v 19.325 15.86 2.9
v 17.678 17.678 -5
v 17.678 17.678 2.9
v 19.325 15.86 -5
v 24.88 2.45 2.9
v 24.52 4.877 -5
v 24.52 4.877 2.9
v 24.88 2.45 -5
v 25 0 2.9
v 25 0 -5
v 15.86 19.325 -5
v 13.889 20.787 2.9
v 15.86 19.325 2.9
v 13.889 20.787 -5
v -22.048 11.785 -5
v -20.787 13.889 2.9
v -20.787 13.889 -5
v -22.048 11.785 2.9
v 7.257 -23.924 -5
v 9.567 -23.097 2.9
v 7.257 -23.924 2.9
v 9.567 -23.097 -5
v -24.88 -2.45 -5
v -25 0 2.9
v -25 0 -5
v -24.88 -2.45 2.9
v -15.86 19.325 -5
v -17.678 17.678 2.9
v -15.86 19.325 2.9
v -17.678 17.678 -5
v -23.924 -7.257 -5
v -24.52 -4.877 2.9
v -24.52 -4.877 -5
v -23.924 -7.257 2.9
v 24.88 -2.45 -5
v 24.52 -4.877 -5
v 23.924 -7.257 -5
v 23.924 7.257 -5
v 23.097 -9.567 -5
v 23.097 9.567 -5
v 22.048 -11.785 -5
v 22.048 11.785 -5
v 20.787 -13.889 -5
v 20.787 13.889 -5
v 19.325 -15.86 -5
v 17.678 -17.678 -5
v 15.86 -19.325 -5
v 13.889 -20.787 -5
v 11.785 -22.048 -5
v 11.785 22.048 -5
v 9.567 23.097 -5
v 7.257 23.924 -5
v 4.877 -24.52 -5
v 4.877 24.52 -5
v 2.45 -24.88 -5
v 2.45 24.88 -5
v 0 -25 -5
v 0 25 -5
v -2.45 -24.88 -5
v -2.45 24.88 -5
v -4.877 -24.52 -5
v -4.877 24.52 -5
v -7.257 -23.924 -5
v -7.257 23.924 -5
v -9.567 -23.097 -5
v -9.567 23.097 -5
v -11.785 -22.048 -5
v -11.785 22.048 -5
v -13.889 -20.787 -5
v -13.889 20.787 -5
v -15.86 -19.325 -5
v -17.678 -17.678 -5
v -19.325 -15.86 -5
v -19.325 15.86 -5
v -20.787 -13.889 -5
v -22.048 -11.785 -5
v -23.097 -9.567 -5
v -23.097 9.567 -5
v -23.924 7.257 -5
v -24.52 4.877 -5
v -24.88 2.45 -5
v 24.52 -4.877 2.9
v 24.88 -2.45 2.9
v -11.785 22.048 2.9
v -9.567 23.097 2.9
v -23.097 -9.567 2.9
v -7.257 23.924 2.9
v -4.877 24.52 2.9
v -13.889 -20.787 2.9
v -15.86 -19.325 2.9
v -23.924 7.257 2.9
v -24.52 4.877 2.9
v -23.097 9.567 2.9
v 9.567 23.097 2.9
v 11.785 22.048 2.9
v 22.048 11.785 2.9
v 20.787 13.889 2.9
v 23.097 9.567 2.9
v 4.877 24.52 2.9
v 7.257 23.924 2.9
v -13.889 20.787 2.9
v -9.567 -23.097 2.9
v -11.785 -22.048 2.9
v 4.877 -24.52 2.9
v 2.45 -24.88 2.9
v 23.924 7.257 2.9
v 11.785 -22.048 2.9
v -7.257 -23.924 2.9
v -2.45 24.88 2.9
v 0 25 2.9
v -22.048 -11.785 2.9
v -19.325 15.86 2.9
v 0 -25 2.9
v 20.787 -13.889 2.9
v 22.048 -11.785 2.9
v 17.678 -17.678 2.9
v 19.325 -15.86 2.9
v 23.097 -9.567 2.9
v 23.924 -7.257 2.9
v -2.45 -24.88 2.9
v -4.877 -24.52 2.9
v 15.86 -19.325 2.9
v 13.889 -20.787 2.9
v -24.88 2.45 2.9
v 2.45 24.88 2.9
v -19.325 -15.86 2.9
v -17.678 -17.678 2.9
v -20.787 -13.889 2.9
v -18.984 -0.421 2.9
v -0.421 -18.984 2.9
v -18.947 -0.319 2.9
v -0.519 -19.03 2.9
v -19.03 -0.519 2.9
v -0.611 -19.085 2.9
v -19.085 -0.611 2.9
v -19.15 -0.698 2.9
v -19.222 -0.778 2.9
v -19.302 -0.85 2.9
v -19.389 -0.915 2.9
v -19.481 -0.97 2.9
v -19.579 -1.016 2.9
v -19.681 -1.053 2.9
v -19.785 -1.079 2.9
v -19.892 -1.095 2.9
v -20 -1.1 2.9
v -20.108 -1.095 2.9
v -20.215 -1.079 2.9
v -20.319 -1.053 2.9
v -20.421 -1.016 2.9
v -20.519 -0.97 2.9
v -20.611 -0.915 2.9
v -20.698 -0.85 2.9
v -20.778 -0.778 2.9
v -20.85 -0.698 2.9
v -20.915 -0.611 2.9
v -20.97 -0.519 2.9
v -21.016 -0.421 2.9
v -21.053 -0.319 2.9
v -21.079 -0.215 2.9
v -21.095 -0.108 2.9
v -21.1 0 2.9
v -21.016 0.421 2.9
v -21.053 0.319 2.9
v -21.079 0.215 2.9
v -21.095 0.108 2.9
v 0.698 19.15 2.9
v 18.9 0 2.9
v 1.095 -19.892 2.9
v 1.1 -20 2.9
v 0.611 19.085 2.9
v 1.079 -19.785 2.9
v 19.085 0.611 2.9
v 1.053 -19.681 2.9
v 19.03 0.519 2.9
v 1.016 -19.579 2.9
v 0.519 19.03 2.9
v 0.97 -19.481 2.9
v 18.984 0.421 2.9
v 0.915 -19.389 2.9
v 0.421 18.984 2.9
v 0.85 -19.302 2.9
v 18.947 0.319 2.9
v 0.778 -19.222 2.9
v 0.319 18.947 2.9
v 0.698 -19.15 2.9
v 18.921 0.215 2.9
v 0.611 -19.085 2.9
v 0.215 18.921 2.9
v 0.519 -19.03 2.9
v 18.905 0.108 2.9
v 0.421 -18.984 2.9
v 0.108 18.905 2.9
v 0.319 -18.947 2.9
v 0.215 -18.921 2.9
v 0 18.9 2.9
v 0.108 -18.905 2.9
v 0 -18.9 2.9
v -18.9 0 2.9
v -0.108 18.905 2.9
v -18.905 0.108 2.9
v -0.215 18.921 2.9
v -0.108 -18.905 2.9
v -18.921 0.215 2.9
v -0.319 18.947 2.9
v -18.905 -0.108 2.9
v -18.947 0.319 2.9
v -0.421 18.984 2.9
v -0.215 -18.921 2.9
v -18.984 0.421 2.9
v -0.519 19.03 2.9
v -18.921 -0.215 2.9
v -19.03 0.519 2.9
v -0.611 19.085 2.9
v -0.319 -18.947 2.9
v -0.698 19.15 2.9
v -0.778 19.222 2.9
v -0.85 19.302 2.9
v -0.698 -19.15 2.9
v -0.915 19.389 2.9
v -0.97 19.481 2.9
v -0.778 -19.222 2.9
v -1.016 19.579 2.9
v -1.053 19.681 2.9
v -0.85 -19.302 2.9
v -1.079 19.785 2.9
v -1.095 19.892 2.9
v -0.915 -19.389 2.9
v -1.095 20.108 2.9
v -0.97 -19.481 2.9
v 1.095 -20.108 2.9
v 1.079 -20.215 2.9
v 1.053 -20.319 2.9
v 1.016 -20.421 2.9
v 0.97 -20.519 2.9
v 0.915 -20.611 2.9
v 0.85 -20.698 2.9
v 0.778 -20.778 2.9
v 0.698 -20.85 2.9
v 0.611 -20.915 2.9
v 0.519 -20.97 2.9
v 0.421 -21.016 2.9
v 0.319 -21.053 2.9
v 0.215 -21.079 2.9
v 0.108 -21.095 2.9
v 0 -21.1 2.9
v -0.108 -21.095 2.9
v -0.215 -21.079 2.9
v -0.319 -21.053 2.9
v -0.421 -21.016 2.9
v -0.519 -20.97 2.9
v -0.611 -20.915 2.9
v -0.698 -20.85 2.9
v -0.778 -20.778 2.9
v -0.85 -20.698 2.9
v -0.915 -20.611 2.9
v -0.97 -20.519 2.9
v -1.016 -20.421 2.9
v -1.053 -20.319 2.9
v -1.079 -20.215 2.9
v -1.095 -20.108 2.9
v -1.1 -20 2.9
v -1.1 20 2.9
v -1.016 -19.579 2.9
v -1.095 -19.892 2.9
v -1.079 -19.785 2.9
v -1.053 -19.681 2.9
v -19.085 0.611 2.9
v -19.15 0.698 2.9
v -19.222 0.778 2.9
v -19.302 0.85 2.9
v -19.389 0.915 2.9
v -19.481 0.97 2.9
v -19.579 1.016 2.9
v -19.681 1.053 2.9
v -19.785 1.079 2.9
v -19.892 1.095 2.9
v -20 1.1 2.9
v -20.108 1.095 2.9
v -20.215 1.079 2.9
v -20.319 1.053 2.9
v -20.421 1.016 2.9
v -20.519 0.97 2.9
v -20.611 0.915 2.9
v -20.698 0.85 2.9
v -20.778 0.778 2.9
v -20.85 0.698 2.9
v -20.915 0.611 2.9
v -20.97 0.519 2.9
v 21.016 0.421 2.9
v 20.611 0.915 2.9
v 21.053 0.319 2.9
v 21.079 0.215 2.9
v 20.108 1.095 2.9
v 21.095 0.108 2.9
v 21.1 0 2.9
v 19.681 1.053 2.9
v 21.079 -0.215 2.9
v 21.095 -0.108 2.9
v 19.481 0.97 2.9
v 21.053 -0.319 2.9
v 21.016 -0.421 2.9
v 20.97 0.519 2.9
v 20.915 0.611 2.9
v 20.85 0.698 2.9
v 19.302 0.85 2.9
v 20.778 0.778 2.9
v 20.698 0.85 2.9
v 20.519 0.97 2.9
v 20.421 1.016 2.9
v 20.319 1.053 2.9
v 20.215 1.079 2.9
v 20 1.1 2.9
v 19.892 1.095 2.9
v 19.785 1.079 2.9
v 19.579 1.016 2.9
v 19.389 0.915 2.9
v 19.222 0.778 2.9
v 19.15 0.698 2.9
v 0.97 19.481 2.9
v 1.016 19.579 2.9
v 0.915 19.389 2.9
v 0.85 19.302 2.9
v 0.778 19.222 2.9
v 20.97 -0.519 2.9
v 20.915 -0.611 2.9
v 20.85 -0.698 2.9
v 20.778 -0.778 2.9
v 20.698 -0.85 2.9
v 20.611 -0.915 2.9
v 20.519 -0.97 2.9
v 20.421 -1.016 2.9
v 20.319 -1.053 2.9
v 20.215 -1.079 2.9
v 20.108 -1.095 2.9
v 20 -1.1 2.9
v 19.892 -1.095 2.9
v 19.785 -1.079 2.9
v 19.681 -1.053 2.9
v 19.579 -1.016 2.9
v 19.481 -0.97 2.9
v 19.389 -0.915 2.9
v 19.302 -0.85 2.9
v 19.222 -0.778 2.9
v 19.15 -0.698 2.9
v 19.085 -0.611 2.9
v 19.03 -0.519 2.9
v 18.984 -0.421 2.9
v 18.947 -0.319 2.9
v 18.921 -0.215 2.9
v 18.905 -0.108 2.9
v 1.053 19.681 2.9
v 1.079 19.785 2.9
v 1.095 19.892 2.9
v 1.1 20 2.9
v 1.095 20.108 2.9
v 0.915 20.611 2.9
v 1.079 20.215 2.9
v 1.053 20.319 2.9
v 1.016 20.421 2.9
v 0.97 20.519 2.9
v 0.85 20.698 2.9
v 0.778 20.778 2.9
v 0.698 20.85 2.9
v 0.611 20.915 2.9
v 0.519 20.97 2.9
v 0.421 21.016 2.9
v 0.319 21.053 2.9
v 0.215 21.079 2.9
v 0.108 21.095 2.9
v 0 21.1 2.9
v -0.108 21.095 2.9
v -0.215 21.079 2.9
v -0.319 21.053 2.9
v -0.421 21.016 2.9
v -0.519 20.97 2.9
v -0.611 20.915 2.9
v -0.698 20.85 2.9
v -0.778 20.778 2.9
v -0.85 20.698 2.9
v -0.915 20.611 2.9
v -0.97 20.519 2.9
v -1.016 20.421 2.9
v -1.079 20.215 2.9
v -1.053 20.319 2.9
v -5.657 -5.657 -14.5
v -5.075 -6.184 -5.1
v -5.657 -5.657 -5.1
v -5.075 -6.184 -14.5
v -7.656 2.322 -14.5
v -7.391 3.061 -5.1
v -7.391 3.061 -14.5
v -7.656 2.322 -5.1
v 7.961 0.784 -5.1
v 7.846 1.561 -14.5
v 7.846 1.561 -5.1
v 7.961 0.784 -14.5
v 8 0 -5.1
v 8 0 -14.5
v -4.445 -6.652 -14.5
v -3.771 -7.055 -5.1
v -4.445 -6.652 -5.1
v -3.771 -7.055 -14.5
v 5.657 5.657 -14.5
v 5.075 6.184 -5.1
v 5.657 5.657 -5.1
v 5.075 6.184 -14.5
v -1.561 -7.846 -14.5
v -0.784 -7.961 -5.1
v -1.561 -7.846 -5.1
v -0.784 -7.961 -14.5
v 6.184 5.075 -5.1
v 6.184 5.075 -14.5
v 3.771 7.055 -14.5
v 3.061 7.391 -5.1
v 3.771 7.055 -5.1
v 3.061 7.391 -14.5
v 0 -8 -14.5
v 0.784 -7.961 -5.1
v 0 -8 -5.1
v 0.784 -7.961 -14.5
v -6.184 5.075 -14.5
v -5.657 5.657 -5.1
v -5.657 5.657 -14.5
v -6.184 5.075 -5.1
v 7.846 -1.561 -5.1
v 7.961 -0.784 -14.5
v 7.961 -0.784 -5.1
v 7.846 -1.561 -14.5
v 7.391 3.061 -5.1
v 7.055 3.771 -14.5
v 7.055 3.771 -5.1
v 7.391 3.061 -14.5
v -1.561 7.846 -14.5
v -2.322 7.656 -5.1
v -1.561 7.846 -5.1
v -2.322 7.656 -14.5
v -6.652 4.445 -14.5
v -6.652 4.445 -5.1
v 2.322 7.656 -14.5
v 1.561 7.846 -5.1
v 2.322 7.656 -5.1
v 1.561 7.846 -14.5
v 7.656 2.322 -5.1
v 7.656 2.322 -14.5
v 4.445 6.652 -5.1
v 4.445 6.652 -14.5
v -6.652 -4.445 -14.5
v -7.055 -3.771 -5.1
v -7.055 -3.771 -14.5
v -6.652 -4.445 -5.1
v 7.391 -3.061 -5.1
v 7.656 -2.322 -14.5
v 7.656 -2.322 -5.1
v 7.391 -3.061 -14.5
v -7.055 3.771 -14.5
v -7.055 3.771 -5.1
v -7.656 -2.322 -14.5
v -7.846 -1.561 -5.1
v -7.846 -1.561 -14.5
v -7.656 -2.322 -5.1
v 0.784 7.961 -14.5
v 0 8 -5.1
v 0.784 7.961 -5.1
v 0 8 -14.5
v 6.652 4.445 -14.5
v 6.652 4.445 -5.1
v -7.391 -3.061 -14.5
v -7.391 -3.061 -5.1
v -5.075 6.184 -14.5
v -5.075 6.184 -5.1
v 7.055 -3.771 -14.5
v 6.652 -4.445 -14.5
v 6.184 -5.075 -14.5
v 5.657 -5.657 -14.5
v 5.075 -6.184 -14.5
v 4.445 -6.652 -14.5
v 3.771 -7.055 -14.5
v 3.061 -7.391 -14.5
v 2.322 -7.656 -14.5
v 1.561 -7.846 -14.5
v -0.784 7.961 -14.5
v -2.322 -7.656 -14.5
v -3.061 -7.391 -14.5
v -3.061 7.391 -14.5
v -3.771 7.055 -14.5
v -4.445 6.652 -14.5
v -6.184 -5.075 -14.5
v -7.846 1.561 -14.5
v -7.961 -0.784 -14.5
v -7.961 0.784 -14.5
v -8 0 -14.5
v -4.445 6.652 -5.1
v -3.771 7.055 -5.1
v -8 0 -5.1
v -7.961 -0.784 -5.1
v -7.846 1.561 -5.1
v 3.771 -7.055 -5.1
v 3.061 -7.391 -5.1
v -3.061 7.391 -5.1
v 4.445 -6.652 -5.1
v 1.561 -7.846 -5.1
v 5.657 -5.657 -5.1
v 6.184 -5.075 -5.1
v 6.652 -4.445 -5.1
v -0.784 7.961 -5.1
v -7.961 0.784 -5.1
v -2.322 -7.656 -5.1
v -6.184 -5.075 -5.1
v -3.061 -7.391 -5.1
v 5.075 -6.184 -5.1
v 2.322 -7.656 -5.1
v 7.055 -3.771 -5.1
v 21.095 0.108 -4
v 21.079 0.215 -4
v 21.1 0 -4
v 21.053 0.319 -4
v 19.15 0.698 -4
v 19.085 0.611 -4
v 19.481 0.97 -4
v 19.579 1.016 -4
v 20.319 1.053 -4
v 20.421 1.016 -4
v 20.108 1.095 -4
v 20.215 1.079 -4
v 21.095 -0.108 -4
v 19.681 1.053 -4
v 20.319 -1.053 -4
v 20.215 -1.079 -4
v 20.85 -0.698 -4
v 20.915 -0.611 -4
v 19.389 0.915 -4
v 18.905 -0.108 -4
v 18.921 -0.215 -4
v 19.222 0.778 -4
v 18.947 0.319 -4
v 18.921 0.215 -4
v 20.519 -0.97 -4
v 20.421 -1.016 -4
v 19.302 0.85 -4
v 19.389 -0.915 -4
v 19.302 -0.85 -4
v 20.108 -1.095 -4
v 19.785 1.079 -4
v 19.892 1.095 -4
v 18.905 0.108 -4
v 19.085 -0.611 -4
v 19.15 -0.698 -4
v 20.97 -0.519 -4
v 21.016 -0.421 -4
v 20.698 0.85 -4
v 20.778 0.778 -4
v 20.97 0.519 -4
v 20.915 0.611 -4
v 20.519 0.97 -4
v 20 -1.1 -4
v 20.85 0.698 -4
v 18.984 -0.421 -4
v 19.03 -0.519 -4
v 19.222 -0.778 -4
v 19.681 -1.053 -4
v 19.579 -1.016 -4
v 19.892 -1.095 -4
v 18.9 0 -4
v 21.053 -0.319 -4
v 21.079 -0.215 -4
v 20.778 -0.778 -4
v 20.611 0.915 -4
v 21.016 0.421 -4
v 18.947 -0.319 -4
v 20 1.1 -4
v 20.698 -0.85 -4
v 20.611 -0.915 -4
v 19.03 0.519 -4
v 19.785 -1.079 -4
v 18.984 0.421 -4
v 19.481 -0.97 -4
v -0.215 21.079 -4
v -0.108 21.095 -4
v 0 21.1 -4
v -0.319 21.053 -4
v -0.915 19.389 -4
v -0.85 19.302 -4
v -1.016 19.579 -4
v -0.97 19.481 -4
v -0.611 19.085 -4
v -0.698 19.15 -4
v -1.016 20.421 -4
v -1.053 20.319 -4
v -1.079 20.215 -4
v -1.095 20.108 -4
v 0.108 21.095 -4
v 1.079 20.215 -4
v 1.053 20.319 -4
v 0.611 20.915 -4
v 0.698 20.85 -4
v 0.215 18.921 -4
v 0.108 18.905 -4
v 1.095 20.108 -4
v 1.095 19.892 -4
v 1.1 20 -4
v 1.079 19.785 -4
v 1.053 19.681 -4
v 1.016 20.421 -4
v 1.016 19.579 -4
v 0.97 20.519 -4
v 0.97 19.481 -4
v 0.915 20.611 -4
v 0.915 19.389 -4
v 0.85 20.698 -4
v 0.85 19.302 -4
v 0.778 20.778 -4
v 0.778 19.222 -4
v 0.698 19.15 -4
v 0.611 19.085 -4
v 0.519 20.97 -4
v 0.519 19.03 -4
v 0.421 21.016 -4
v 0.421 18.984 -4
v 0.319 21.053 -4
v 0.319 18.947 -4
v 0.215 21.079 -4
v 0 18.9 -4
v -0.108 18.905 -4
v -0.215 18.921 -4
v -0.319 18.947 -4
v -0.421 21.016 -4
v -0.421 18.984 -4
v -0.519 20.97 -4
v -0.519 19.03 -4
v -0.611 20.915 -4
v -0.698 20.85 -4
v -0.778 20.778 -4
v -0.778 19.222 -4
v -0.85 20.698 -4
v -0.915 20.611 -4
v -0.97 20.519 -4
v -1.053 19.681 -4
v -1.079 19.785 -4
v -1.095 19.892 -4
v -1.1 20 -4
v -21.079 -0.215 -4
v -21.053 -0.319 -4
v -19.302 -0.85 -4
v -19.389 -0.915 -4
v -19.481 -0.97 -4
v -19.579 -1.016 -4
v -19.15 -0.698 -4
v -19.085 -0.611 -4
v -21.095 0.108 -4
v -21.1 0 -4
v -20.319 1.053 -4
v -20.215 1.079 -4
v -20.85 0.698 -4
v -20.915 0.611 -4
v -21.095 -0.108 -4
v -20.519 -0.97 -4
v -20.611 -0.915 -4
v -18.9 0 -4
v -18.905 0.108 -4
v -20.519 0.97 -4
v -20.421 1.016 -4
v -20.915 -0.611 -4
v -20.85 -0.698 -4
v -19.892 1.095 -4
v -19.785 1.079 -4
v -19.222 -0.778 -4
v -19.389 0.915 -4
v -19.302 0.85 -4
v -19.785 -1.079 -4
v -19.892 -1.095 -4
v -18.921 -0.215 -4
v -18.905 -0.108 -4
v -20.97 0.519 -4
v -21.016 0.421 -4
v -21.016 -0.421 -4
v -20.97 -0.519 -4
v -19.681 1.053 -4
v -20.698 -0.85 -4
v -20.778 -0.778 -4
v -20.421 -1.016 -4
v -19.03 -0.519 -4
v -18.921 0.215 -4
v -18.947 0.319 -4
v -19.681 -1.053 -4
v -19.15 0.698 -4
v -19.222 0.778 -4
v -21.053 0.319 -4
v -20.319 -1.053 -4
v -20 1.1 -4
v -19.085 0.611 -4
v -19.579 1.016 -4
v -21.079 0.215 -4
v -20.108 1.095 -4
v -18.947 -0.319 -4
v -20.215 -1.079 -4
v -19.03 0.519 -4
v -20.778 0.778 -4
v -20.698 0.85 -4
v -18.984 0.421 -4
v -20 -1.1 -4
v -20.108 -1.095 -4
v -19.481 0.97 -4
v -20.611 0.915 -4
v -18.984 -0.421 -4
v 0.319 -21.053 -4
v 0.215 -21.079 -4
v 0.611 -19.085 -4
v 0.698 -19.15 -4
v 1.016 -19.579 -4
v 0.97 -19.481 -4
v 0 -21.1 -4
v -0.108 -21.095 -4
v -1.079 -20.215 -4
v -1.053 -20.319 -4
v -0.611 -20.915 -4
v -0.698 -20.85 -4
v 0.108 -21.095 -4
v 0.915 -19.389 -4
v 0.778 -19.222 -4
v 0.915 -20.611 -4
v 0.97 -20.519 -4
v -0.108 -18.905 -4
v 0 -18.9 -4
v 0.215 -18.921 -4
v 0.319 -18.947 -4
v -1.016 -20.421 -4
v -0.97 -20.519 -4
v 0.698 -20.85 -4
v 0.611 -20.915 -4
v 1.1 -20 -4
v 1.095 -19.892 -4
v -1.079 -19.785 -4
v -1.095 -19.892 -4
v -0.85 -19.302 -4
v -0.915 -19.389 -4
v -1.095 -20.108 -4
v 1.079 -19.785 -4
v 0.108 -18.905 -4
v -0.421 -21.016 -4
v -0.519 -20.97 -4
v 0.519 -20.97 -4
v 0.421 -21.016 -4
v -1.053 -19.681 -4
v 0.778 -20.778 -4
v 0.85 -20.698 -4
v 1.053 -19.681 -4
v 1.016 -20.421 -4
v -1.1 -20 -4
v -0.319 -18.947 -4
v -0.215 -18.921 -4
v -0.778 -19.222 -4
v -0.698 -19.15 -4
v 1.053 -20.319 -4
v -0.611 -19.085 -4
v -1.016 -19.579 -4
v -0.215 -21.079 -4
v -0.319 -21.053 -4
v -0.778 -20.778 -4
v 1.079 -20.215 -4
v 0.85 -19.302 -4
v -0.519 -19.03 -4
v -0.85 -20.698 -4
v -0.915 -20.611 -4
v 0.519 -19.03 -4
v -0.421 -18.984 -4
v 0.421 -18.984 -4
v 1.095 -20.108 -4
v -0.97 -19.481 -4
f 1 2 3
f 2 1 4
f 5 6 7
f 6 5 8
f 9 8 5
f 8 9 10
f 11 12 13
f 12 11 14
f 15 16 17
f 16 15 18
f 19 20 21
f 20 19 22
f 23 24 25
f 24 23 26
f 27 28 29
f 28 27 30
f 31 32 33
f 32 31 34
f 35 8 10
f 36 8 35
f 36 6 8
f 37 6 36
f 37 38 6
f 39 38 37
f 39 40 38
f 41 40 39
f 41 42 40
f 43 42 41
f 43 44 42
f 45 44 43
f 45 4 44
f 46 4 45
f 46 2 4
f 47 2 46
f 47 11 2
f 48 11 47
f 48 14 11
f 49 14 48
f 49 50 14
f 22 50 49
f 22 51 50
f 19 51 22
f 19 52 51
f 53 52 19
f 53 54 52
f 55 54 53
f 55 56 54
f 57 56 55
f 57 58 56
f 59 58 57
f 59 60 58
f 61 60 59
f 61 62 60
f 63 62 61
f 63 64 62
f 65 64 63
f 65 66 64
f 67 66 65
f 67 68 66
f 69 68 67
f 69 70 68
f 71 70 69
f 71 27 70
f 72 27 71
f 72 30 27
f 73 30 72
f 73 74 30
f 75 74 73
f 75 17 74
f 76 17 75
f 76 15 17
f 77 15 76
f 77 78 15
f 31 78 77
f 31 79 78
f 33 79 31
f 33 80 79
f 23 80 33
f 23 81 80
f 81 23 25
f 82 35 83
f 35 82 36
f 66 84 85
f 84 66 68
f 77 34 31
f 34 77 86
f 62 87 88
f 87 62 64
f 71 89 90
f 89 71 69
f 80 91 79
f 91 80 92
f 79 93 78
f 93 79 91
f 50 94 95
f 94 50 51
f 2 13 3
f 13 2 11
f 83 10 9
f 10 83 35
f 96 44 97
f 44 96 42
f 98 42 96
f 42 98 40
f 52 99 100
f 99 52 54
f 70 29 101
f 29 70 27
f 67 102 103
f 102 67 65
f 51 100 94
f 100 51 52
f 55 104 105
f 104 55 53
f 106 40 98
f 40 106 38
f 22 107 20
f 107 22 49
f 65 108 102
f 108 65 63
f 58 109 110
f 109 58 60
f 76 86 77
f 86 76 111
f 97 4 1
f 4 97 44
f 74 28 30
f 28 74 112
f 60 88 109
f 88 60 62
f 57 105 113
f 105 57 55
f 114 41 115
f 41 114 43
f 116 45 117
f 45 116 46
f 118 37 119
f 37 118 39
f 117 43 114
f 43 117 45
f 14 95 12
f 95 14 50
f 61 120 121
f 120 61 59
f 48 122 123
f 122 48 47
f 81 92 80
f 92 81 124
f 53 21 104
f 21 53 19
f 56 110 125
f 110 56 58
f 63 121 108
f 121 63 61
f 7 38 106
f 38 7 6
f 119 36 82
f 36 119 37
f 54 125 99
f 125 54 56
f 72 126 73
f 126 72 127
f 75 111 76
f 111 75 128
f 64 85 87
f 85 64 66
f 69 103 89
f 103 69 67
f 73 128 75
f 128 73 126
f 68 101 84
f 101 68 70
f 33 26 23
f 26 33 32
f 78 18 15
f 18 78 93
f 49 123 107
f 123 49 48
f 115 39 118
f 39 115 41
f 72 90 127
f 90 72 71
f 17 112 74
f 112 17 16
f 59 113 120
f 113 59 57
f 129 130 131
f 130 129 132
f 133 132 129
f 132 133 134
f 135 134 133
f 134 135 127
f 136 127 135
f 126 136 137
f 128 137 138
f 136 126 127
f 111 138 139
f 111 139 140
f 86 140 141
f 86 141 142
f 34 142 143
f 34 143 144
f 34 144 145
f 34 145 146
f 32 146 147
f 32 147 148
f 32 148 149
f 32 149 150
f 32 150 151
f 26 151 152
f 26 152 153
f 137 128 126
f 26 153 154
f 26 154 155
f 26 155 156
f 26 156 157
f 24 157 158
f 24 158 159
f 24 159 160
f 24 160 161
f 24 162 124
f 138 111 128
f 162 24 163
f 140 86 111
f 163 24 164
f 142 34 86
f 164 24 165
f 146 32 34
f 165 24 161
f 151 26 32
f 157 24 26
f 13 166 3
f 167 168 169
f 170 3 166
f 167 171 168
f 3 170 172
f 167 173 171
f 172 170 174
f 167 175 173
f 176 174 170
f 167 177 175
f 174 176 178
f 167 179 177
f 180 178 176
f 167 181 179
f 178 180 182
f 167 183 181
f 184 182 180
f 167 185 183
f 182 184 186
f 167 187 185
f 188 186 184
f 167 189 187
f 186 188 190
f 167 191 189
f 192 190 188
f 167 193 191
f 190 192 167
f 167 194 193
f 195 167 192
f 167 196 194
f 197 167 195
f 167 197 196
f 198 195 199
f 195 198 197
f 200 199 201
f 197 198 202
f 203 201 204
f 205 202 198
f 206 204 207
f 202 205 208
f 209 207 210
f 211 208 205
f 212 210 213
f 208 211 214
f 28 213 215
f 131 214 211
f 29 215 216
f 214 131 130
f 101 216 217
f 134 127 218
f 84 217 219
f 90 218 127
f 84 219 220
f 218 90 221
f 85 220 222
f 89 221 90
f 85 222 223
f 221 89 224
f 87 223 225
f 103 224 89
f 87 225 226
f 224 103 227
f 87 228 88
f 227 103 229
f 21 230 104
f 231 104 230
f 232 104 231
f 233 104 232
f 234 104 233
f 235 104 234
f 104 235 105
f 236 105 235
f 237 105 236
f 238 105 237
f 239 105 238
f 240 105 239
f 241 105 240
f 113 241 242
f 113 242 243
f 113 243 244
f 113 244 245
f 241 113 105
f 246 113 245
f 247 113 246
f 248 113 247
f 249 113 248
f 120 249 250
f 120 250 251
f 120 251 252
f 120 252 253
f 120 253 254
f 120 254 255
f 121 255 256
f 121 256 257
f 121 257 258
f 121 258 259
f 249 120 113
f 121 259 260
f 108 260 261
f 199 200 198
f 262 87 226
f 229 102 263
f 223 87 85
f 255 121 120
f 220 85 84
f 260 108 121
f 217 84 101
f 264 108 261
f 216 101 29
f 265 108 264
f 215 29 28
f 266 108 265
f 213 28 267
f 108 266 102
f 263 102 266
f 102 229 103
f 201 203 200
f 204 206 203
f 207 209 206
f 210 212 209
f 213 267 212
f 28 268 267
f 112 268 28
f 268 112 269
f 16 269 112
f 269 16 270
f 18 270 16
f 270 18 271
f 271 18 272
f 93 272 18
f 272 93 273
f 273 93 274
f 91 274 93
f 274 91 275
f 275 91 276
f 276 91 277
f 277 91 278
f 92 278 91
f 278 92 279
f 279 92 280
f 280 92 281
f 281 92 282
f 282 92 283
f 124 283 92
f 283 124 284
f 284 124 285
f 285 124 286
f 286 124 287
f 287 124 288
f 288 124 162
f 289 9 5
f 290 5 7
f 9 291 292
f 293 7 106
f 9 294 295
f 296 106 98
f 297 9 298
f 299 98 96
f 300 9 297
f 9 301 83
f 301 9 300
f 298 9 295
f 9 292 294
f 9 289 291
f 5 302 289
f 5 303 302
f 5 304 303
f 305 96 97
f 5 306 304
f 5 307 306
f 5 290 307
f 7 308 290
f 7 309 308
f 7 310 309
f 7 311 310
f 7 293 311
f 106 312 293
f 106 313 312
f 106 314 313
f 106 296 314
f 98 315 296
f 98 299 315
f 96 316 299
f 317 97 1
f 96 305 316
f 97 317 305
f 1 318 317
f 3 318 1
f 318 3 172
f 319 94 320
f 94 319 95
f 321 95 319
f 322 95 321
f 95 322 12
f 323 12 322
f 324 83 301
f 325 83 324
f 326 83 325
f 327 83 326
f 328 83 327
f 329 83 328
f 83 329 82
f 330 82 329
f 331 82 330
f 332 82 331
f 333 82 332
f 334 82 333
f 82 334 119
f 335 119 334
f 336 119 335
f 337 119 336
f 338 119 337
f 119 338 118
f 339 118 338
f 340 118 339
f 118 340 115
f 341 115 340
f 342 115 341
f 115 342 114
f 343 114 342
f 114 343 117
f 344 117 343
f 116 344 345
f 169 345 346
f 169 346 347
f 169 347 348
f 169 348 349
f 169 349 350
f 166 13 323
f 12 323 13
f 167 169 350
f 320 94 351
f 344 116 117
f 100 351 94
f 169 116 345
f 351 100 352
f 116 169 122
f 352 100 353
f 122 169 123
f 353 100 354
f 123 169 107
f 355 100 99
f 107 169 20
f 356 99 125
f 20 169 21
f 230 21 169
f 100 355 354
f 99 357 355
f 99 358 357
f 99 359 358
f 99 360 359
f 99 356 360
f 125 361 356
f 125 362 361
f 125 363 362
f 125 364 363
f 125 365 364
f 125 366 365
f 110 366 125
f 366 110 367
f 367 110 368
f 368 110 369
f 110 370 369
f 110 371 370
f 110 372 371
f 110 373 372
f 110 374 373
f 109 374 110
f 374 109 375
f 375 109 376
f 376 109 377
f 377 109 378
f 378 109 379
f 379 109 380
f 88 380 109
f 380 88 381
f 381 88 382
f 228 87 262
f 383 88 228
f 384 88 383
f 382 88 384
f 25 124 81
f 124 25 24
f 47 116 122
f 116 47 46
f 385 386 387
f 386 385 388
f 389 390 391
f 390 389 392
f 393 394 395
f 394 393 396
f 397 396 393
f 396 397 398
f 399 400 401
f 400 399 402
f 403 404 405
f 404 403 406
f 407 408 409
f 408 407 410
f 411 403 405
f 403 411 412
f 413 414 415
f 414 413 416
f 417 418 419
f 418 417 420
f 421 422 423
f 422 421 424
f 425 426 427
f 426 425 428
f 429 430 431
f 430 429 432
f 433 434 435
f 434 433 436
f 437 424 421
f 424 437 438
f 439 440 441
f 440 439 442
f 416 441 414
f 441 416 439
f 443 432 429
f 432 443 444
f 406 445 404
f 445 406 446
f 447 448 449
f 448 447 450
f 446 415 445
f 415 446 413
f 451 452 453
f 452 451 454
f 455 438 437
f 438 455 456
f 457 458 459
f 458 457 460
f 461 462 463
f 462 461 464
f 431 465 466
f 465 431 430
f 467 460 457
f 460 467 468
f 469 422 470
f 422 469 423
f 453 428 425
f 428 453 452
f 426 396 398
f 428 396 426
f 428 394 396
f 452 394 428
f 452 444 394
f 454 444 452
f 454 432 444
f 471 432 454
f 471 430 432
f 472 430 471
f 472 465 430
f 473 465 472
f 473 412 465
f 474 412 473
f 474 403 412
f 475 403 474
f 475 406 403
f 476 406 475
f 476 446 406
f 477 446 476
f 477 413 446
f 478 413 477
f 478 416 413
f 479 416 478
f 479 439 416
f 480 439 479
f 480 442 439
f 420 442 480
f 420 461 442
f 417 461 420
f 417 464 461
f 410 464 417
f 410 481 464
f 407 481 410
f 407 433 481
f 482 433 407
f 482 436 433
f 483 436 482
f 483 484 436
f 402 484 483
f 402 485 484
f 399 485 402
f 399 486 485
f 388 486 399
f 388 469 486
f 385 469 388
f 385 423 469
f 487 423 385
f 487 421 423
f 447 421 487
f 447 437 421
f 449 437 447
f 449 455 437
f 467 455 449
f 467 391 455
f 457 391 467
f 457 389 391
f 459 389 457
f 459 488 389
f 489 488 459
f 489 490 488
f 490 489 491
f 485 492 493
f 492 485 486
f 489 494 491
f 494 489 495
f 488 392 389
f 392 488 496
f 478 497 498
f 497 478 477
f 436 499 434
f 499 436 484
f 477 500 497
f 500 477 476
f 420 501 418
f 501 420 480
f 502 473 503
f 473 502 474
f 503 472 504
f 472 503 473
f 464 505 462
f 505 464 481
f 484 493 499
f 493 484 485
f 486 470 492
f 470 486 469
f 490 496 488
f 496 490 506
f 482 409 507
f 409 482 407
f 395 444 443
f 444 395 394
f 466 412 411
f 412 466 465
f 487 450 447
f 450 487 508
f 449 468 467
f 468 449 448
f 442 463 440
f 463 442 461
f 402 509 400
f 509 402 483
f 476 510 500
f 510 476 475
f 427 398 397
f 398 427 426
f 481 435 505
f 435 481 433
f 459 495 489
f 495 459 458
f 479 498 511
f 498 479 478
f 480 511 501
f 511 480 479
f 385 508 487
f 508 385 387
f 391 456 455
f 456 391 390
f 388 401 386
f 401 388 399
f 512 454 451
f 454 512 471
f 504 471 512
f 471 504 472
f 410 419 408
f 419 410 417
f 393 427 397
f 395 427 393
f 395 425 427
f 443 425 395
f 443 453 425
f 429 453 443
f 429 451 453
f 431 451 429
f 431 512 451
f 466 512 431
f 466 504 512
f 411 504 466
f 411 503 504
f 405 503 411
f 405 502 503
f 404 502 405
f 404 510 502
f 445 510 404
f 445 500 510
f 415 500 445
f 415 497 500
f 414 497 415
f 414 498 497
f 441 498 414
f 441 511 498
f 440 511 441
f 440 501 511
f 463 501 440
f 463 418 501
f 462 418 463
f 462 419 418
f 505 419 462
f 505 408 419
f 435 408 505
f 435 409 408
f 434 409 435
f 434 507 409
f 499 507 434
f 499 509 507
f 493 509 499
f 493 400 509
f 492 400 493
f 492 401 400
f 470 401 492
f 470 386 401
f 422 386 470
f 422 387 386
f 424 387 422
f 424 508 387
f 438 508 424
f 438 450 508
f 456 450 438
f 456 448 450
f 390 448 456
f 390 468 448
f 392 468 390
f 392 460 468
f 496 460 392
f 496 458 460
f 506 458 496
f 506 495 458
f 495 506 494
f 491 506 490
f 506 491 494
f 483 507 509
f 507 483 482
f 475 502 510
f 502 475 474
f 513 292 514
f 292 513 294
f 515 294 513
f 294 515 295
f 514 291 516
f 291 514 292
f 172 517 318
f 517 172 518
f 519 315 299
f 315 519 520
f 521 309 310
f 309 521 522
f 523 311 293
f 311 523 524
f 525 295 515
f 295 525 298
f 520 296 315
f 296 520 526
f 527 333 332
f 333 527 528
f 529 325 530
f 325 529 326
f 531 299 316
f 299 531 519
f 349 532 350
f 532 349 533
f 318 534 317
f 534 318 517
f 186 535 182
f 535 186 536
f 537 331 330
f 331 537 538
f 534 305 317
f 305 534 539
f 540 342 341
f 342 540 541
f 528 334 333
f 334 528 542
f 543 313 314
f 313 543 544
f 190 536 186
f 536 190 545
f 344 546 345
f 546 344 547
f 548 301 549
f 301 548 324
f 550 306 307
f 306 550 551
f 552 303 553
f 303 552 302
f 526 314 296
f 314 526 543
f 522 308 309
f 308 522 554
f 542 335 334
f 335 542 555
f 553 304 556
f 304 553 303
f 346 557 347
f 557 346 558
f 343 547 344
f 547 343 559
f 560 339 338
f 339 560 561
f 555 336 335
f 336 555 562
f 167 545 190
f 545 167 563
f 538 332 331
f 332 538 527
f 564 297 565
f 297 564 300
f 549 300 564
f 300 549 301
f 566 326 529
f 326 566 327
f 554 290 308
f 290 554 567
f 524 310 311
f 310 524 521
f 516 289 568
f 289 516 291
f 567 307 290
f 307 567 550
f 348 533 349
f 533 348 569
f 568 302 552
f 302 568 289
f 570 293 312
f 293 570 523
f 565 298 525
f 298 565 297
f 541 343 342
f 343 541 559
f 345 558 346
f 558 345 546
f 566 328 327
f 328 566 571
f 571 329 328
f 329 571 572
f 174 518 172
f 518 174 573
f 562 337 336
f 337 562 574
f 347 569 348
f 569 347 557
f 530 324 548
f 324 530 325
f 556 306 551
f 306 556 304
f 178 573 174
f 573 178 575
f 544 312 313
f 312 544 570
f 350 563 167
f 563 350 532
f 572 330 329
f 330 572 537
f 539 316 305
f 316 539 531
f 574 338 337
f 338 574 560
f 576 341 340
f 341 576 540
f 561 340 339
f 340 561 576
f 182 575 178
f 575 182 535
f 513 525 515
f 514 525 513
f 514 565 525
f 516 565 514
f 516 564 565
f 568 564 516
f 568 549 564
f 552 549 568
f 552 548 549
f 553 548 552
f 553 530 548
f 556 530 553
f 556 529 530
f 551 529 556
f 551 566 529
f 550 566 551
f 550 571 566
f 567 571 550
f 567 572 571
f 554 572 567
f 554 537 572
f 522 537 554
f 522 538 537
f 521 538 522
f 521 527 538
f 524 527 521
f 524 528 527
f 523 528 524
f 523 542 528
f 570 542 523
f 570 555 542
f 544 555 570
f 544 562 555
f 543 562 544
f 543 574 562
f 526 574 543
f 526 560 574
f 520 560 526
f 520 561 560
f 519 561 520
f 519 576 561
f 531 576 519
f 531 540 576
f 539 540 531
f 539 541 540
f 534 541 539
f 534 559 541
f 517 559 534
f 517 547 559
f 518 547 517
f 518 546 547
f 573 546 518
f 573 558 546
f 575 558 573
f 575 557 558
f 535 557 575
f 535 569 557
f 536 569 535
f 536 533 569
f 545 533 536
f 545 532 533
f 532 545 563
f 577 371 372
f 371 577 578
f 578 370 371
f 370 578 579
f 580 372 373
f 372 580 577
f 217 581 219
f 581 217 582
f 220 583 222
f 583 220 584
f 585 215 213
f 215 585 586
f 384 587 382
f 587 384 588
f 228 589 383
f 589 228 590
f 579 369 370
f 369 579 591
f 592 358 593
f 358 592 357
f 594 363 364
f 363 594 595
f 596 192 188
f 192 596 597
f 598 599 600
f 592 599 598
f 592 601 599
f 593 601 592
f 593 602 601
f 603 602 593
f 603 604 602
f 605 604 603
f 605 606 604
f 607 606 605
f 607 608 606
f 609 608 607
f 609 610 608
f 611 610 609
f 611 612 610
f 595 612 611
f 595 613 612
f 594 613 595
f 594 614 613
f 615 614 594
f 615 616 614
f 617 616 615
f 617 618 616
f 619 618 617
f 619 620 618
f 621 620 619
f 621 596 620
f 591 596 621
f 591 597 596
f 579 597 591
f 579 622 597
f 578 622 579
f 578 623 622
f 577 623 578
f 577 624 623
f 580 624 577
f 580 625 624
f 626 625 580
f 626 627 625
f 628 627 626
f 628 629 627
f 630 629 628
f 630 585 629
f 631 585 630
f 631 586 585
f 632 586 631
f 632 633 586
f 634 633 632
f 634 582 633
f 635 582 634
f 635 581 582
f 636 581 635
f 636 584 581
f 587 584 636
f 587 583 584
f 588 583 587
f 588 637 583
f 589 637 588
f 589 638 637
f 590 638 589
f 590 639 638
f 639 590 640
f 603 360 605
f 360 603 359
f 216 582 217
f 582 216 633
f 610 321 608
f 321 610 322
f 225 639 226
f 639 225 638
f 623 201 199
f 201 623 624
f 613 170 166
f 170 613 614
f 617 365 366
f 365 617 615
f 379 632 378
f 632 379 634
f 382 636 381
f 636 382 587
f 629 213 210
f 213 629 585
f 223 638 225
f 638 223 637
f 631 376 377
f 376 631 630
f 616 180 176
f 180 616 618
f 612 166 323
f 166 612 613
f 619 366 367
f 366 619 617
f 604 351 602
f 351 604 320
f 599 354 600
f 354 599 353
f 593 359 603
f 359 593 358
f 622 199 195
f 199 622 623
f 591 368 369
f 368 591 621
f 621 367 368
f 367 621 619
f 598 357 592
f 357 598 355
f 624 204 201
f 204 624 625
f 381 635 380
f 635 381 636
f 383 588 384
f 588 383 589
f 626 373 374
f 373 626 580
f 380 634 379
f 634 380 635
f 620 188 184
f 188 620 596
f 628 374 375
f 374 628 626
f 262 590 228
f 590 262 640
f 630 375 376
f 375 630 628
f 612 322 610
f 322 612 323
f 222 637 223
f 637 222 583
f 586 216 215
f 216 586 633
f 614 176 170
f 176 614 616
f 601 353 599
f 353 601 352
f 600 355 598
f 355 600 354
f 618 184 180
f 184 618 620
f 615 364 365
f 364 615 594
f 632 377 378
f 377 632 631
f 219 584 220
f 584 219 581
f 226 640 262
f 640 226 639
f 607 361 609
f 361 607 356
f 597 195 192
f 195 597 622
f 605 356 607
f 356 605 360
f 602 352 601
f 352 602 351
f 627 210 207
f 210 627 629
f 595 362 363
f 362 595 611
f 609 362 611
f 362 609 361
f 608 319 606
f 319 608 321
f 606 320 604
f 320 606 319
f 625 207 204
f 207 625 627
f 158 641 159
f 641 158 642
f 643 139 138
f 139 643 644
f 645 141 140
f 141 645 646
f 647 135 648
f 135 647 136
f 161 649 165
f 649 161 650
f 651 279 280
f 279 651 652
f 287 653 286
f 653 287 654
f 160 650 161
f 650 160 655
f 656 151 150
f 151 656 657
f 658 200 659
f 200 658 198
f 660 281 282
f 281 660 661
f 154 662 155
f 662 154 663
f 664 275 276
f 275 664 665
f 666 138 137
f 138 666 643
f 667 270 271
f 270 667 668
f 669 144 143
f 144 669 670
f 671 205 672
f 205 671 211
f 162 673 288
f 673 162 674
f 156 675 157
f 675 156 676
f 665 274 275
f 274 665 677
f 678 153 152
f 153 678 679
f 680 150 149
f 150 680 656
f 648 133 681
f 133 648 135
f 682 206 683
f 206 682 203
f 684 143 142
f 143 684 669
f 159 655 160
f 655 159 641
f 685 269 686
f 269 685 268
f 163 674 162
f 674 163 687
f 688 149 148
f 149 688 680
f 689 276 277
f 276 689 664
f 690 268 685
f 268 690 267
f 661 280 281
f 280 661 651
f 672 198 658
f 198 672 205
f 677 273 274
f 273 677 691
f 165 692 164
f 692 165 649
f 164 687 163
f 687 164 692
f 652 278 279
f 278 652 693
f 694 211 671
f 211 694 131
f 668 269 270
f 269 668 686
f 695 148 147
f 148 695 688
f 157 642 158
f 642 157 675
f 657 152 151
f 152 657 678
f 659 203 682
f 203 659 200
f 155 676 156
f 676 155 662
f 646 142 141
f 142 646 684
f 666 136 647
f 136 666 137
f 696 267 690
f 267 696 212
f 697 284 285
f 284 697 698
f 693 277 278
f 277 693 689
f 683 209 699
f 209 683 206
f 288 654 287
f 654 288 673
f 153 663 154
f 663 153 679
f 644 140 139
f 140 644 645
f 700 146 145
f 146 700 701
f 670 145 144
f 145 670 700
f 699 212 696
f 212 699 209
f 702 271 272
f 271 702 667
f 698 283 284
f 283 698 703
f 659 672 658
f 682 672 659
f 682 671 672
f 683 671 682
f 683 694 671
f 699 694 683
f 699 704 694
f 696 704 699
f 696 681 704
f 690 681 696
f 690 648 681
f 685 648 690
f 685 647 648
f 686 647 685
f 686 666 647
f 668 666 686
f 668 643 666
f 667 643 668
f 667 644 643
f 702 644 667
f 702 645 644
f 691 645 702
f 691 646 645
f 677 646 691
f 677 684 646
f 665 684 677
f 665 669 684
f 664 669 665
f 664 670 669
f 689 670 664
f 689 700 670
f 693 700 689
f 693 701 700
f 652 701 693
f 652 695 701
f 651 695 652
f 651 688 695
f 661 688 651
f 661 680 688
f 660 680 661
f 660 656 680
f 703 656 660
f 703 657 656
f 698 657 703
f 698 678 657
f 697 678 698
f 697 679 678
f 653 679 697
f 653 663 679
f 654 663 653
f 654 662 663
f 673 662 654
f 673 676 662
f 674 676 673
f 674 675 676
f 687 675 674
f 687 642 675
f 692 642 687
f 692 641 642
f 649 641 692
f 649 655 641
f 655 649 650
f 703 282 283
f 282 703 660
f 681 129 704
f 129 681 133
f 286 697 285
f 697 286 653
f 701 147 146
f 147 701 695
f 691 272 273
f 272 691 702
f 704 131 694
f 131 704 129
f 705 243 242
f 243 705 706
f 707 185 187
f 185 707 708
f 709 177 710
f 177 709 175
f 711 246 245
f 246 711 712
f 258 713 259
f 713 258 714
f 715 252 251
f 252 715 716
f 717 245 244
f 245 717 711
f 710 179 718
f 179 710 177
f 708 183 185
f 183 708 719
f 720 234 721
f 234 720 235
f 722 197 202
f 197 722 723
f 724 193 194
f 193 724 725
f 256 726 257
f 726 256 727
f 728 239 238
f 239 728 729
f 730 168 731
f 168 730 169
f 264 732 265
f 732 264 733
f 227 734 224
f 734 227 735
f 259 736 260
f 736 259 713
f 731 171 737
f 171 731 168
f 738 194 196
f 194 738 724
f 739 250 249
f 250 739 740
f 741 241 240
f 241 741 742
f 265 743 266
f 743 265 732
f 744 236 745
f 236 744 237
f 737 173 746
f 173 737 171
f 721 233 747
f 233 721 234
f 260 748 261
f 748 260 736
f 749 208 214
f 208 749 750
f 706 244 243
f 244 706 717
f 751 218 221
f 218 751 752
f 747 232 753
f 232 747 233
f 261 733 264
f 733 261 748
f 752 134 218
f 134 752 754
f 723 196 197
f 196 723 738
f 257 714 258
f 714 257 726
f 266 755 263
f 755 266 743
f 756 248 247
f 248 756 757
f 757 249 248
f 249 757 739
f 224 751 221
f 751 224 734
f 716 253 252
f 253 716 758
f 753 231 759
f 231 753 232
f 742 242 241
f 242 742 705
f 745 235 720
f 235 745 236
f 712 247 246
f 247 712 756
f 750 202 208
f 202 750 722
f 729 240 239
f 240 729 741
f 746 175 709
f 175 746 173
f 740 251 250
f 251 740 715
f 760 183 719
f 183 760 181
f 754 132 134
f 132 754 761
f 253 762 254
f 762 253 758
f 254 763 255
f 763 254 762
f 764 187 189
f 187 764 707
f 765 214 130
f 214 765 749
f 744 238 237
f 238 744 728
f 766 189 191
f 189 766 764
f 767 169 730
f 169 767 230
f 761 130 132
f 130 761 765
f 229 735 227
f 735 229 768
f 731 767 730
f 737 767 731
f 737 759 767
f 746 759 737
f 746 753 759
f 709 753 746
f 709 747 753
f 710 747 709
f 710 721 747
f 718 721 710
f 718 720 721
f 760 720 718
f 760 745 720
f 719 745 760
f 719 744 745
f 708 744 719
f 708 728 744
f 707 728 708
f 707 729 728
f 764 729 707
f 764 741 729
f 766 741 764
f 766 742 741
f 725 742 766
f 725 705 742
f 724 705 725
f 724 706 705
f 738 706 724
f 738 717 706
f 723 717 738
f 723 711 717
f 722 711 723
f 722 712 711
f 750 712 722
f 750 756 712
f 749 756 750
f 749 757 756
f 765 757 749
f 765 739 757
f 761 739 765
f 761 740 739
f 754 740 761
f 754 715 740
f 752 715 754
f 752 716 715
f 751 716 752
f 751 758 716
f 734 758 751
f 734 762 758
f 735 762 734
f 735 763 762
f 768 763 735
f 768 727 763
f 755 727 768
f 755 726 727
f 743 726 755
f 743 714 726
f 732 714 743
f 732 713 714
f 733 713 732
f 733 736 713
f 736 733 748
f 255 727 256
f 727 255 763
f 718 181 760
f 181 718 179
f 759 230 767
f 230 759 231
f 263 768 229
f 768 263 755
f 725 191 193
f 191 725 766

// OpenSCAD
// ============================================================================
// Atom Lithography Machine — Parametric OpenSCAD Module (S6.6-07)
// ============================================================================
// part_id           : S6.6-07
// parent_bom_id     : S6.6
// subsystem         : S6
// part_name         : NbTiN superiletken spiral cogullamali rezonator yongalari ve paketleme (9000 kanal)
// material          : OFHC Cu
// temp_stage        : 20 mK (MXC)
// vacuum_grade      : UHV / Kriyo-vakum
// tolerance         : sigma_f <= 0.27%
// computed_mass_kg  : 0.12901
// envelope_mm       : 50.000 x 50.000 x 23.000
// design_maturity   : M0_M1_DETAILED_CAD_DESIGN_ONLY
// no_lab_measurement: true
// iec61508_certified: false
// semi_s2_certified : false
// Units: millimeters (mm)
// ============================================================================

$fn = 64;

// Nominal bounding envelope parameters (mm)
bbox_x = 50.0000;
bbox_y = 50.0000;
bbox_z = 23.0000;

// Part-specific parametric dimensions
pkg_od = 50.0;
n_resonators = 9000;
b_max_ut = 22.3;
ql_nom = 1000;

// Interface / port parameters (mm)
port_smp_4port_top_od = 36.000;
port_thermal_20mk_stem_od = 16.000;

module part_S6_6_07() {
  difference() {
    union() {
      // Ø50 mm OFHC resonator carrier
      translate([0.000, 0.000, -1.050]) cylinder(d=50.000, h=7.900, center=true);
      // 20 mK thermal stem
      translate([0.000, 0.000, -9.800]) cylinder(d=16.000, h=9.400, center=true);
    }
    // 4x M2 package clamp bolts
    for (i = [0 : 4 - 1])
      rotate([0, 0, i * 360 / 4])
        translate([20.000, 0, 0])
          cylinder(d=2.200, h=8.000, center=true);
  }
}

// World assembly mounting transform (global machine frame, mm / deg):
// translate([0.000, 0.000, 345.000]) rotate([0.000, 0.000, 0.000]) part_S6_6_07();

part_S6_6_07();
